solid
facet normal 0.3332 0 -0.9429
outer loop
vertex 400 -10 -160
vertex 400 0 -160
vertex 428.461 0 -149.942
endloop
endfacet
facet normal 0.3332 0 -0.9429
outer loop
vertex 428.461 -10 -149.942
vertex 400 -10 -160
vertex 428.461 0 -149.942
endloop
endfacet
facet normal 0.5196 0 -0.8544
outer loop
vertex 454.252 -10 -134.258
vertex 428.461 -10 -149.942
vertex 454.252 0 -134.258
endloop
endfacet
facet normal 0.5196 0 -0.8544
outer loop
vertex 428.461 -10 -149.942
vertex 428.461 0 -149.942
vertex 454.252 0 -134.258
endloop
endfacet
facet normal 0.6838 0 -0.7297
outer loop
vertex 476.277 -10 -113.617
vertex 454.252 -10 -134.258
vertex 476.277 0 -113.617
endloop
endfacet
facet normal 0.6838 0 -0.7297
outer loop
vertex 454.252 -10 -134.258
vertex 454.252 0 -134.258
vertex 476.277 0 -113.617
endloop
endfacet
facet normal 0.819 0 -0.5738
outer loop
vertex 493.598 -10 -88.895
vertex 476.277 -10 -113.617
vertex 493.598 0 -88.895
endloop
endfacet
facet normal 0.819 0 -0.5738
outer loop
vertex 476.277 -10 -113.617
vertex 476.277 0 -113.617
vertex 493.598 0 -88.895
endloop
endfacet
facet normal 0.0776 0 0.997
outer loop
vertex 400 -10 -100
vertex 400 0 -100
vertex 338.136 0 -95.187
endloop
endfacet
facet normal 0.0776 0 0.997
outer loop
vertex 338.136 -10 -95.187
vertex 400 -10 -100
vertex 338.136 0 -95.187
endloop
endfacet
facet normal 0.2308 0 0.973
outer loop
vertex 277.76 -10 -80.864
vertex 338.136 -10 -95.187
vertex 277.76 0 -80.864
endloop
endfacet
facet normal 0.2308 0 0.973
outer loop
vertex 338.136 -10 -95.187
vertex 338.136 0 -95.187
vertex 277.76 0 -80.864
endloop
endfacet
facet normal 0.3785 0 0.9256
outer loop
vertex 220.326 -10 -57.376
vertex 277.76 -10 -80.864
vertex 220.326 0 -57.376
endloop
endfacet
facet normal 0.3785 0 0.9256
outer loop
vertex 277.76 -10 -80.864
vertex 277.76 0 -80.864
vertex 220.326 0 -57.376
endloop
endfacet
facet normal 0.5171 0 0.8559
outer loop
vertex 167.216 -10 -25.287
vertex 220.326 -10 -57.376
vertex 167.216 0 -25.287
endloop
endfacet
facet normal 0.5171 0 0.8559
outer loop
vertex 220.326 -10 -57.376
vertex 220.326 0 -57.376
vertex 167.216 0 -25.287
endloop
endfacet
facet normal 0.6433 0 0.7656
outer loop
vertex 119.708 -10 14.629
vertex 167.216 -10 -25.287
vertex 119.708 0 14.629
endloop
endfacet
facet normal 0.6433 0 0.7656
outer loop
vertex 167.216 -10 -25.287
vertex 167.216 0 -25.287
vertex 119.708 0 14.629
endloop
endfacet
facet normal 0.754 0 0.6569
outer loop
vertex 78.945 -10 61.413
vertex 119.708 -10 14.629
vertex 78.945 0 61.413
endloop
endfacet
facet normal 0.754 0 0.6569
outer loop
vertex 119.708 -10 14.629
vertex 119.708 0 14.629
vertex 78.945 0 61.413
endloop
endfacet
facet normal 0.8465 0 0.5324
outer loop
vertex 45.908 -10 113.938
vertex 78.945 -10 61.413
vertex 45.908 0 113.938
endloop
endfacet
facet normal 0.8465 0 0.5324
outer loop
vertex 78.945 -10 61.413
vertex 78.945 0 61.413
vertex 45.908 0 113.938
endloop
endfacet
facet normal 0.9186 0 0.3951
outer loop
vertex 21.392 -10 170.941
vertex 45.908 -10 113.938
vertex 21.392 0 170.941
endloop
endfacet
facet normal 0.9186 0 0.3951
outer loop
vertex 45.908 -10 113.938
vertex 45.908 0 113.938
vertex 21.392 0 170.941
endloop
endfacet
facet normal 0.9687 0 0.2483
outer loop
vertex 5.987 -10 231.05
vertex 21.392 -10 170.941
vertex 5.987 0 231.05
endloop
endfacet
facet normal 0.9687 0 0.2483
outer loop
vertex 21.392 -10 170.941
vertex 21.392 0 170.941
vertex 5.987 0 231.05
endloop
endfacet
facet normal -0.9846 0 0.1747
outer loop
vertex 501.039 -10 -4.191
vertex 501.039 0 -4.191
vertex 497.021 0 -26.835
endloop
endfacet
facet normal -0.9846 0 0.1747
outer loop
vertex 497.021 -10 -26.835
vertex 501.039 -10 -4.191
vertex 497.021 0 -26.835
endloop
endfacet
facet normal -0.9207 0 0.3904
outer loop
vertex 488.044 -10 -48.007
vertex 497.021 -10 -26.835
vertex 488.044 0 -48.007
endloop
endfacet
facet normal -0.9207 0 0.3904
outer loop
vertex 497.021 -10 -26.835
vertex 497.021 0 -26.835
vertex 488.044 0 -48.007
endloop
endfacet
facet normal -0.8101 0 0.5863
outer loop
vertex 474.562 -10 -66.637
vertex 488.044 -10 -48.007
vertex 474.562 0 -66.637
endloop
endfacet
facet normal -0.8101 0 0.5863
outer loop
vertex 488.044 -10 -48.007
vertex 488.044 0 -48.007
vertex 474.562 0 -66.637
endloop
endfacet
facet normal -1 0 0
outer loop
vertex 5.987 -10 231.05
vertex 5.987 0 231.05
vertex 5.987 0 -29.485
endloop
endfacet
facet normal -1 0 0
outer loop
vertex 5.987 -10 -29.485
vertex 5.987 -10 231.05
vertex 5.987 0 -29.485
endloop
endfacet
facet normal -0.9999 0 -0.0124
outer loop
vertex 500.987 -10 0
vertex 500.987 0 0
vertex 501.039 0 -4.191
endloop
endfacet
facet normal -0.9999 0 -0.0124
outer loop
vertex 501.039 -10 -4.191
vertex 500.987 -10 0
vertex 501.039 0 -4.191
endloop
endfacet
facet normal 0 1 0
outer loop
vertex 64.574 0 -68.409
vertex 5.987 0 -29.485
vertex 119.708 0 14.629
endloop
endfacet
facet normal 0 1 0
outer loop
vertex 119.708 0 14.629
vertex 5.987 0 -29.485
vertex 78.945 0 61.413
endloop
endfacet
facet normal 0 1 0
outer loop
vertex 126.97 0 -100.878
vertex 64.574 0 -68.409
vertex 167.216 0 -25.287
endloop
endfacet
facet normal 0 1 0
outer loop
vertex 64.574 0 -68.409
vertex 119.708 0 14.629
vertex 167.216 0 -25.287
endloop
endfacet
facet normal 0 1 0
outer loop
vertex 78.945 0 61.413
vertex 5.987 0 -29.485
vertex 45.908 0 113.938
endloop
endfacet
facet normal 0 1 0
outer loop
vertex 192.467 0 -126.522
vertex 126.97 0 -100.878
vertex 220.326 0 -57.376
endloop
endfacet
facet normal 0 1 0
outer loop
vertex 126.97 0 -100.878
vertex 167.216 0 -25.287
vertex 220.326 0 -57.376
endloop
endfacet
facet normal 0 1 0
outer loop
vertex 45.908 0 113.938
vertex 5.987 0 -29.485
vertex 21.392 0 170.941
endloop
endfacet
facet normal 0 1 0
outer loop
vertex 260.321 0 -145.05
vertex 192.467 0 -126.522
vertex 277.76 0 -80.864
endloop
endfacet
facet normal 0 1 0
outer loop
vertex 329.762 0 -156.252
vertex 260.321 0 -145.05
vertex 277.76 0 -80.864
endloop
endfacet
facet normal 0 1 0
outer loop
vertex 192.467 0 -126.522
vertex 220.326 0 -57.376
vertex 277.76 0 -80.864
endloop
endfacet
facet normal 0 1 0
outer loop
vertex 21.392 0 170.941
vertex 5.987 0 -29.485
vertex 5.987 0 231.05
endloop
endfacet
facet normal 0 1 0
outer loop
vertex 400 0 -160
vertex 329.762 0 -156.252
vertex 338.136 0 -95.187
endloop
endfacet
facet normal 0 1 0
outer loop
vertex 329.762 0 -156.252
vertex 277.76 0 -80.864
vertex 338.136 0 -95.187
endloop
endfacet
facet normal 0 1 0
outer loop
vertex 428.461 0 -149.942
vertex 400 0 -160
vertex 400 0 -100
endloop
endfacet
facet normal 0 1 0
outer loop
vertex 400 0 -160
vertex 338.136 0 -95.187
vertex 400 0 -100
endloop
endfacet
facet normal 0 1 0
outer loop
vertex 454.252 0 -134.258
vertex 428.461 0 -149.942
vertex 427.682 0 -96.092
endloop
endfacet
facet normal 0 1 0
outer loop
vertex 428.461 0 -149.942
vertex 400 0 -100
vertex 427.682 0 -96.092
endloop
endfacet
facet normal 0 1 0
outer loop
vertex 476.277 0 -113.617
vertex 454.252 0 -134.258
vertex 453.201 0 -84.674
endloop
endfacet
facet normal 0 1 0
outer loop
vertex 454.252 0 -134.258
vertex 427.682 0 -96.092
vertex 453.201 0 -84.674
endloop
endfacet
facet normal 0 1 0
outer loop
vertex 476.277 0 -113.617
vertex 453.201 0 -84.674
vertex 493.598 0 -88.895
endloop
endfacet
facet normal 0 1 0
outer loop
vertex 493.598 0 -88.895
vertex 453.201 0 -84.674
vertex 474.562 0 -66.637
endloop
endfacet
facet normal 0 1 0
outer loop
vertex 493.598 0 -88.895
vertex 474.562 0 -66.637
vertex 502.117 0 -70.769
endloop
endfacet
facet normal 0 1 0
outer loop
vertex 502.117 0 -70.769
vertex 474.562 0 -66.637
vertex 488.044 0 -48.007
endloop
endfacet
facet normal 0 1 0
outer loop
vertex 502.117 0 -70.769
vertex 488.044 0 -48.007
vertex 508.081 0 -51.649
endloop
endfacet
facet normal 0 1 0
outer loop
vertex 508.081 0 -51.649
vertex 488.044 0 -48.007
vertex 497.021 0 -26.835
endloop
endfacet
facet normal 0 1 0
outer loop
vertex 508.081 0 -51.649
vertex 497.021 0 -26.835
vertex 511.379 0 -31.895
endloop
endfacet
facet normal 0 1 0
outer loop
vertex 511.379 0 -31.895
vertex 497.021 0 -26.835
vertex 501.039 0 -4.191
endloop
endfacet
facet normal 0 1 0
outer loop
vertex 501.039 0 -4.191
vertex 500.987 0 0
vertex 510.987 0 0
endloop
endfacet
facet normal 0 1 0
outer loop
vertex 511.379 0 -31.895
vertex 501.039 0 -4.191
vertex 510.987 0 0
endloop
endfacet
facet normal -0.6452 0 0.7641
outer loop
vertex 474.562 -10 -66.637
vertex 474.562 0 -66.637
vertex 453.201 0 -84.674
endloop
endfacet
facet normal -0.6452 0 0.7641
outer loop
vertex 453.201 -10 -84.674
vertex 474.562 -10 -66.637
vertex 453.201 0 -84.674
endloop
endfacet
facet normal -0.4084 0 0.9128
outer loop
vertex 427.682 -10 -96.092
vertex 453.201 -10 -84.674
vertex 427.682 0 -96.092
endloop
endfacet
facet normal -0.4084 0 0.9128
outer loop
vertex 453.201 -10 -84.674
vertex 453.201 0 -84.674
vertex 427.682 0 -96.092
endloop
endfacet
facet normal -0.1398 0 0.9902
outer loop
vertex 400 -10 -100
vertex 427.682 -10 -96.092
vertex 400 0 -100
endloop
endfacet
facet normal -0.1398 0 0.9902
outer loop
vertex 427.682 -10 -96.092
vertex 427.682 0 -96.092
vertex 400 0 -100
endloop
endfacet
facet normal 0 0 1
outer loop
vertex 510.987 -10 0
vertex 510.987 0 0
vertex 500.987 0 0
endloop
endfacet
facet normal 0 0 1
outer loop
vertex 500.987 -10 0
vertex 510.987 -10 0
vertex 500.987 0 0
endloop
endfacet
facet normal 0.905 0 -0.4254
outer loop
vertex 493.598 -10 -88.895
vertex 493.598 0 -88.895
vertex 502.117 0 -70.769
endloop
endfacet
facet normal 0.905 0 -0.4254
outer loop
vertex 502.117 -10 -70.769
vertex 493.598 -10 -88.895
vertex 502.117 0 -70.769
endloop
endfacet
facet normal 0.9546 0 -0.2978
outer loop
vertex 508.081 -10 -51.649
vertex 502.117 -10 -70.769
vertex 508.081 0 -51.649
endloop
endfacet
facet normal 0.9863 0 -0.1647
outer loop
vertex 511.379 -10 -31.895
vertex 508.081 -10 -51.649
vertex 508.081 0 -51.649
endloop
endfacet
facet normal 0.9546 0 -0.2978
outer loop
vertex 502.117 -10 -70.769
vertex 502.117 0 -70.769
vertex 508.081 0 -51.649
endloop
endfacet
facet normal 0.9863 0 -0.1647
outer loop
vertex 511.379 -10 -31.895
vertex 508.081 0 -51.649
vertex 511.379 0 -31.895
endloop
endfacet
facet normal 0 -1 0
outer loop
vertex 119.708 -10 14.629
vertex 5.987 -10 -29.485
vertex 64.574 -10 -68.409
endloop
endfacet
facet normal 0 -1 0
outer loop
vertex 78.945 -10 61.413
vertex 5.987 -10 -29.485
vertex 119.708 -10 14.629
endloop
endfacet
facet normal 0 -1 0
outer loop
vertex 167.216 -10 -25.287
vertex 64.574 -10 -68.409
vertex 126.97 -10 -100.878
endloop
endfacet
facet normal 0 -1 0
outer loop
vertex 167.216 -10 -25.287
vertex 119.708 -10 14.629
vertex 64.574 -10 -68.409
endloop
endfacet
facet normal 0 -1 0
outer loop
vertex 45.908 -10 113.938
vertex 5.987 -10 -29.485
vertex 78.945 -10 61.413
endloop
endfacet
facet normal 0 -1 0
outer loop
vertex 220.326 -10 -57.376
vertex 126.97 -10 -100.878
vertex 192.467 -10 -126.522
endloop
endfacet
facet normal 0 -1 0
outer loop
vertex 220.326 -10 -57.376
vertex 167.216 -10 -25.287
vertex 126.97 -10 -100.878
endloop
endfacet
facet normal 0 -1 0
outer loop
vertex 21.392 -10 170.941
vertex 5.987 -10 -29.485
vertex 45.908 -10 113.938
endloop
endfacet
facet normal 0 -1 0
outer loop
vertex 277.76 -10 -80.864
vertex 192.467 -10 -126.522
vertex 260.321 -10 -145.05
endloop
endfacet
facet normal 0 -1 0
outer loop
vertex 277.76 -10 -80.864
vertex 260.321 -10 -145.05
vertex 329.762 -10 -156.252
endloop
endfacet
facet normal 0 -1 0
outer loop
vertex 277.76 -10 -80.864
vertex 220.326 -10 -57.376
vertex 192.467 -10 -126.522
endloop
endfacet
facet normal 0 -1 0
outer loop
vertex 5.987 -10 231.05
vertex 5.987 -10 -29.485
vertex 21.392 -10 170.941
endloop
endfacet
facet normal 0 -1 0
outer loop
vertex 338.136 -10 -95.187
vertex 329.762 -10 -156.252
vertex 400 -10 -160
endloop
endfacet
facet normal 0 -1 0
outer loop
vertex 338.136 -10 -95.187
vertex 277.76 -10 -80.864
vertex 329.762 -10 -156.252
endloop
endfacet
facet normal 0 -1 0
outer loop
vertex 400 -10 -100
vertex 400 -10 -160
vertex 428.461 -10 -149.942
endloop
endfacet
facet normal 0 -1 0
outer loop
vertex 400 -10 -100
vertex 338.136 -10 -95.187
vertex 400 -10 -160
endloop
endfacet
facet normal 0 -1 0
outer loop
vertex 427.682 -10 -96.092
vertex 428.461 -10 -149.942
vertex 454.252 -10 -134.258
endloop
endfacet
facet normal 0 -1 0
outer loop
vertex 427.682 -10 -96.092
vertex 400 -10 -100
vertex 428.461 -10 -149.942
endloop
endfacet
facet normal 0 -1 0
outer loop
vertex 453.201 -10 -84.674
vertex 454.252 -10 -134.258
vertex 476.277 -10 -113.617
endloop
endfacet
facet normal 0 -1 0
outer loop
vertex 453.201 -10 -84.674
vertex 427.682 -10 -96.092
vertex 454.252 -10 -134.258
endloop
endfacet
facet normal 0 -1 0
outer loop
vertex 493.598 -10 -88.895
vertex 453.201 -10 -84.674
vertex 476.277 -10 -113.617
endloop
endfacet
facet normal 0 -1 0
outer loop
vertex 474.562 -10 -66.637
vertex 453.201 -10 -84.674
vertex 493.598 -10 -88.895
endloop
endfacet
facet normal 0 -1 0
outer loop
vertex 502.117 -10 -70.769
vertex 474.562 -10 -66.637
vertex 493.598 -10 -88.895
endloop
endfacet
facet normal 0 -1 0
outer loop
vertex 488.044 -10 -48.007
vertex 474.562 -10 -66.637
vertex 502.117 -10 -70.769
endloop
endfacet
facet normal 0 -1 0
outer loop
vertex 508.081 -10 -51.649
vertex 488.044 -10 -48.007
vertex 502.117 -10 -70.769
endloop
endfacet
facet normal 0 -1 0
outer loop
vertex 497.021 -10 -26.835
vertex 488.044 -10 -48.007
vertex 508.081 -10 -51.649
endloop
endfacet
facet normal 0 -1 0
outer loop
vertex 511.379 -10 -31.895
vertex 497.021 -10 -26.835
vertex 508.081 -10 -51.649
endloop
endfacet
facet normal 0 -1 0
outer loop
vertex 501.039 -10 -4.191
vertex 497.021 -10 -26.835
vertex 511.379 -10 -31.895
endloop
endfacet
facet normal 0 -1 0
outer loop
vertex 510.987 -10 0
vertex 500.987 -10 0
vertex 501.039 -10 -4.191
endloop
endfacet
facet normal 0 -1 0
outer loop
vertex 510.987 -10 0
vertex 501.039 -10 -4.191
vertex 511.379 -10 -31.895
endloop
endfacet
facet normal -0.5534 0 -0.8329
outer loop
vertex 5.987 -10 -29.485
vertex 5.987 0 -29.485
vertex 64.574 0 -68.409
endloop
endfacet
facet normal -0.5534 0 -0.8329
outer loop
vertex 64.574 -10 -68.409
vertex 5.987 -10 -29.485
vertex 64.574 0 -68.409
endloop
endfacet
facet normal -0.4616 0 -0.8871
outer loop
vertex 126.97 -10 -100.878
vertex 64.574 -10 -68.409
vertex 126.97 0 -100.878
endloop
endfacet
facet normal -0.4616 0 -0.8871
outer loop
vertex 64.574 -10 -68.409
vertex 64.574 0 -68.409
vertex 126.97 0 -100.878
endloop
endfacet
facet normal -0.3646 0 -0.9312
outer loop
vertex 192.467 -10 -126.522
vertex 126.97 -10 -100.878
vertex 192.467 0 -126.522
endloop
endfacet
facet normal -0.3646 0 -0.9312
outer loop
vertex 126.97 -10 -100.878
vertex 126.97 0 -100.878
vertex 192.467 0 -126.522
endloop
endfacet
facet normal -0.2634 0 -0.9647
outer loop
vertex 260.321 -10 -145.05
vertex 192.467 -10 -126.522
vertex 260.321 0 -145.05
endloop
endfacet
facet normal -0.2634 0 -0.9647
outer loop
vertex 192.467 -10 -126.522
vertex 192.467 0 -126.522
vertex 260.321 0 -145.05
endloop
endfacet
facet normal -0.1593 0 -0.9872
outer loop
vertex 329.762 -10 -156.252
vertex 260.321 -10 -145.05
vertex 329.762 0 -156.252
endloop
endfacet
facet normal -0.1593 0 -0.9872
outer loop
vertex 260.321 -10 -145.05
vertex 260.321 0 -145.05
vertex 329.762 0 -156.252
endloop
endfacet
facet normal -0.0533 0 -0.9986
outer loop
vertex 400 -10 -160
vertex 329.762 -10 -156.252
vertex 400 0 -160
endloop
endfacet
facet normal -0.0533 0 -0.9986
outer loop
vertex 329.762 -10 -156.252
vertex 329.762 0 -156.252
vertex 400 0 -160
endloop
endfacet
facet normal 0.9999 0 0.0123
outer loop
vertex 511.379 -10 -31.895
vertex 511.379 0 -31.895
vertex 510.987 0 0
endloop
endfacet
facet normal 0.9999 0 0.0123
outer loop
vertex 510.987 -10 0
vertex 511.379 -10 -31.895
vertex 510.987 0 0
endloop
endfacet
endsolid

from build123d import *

# Parameters (mm, degrees)
F3_DEPTH = 10


with BuildPart() as f3:
    # F2 (on Front) → F3 (new body)
    with BuildSketch(Plane.XZ):
        with BuildLine():
            ThreePointArc((400, -100), (447.127307, -97.214069), (493.598148, -88.895084))
            ThreePointArc((493.598148, -88.895084), (505.426816, -61.311377), (511.379193, -31.894588))
            Line((511.379193, -31.894588), (510.98747, 0))
            Line((510.98747, 0), (500.98747, 0))
            Line((500.98747, 0), (501.038948, -4.191425))
            ThreePointArc((501.038948, -4.191425), (493.129496, -37.67403), (474.561698, -66.637476))
            ThreePointArc((474.561698, -66.637476), (440.842701, -91.279098), (400, -100))
        make_face()
        with BuildLine():
            Line((5.98747, 22.610795), (5.98747, -29.484774))
            ThreePointArc((5.98747, -29.484774), (192.466811, -126.522127), (400, -160))
            ThreePointArc((400, -160), (454.252189, -134.258366), (493.598148, -88.895084))
            ThreePointArc((493.598148, -88.895084), (447.127307, -97.214069), (400, -100))
            ThreePointArc((400, -100), (142.687028, -6.251587), (5.98747, 231.049827))
            Line((5.98747, 231.049827), (5.98747, 22.610795))
        make_face()
    extrude(amount=F3_DEPTH)


solid = f3.part
